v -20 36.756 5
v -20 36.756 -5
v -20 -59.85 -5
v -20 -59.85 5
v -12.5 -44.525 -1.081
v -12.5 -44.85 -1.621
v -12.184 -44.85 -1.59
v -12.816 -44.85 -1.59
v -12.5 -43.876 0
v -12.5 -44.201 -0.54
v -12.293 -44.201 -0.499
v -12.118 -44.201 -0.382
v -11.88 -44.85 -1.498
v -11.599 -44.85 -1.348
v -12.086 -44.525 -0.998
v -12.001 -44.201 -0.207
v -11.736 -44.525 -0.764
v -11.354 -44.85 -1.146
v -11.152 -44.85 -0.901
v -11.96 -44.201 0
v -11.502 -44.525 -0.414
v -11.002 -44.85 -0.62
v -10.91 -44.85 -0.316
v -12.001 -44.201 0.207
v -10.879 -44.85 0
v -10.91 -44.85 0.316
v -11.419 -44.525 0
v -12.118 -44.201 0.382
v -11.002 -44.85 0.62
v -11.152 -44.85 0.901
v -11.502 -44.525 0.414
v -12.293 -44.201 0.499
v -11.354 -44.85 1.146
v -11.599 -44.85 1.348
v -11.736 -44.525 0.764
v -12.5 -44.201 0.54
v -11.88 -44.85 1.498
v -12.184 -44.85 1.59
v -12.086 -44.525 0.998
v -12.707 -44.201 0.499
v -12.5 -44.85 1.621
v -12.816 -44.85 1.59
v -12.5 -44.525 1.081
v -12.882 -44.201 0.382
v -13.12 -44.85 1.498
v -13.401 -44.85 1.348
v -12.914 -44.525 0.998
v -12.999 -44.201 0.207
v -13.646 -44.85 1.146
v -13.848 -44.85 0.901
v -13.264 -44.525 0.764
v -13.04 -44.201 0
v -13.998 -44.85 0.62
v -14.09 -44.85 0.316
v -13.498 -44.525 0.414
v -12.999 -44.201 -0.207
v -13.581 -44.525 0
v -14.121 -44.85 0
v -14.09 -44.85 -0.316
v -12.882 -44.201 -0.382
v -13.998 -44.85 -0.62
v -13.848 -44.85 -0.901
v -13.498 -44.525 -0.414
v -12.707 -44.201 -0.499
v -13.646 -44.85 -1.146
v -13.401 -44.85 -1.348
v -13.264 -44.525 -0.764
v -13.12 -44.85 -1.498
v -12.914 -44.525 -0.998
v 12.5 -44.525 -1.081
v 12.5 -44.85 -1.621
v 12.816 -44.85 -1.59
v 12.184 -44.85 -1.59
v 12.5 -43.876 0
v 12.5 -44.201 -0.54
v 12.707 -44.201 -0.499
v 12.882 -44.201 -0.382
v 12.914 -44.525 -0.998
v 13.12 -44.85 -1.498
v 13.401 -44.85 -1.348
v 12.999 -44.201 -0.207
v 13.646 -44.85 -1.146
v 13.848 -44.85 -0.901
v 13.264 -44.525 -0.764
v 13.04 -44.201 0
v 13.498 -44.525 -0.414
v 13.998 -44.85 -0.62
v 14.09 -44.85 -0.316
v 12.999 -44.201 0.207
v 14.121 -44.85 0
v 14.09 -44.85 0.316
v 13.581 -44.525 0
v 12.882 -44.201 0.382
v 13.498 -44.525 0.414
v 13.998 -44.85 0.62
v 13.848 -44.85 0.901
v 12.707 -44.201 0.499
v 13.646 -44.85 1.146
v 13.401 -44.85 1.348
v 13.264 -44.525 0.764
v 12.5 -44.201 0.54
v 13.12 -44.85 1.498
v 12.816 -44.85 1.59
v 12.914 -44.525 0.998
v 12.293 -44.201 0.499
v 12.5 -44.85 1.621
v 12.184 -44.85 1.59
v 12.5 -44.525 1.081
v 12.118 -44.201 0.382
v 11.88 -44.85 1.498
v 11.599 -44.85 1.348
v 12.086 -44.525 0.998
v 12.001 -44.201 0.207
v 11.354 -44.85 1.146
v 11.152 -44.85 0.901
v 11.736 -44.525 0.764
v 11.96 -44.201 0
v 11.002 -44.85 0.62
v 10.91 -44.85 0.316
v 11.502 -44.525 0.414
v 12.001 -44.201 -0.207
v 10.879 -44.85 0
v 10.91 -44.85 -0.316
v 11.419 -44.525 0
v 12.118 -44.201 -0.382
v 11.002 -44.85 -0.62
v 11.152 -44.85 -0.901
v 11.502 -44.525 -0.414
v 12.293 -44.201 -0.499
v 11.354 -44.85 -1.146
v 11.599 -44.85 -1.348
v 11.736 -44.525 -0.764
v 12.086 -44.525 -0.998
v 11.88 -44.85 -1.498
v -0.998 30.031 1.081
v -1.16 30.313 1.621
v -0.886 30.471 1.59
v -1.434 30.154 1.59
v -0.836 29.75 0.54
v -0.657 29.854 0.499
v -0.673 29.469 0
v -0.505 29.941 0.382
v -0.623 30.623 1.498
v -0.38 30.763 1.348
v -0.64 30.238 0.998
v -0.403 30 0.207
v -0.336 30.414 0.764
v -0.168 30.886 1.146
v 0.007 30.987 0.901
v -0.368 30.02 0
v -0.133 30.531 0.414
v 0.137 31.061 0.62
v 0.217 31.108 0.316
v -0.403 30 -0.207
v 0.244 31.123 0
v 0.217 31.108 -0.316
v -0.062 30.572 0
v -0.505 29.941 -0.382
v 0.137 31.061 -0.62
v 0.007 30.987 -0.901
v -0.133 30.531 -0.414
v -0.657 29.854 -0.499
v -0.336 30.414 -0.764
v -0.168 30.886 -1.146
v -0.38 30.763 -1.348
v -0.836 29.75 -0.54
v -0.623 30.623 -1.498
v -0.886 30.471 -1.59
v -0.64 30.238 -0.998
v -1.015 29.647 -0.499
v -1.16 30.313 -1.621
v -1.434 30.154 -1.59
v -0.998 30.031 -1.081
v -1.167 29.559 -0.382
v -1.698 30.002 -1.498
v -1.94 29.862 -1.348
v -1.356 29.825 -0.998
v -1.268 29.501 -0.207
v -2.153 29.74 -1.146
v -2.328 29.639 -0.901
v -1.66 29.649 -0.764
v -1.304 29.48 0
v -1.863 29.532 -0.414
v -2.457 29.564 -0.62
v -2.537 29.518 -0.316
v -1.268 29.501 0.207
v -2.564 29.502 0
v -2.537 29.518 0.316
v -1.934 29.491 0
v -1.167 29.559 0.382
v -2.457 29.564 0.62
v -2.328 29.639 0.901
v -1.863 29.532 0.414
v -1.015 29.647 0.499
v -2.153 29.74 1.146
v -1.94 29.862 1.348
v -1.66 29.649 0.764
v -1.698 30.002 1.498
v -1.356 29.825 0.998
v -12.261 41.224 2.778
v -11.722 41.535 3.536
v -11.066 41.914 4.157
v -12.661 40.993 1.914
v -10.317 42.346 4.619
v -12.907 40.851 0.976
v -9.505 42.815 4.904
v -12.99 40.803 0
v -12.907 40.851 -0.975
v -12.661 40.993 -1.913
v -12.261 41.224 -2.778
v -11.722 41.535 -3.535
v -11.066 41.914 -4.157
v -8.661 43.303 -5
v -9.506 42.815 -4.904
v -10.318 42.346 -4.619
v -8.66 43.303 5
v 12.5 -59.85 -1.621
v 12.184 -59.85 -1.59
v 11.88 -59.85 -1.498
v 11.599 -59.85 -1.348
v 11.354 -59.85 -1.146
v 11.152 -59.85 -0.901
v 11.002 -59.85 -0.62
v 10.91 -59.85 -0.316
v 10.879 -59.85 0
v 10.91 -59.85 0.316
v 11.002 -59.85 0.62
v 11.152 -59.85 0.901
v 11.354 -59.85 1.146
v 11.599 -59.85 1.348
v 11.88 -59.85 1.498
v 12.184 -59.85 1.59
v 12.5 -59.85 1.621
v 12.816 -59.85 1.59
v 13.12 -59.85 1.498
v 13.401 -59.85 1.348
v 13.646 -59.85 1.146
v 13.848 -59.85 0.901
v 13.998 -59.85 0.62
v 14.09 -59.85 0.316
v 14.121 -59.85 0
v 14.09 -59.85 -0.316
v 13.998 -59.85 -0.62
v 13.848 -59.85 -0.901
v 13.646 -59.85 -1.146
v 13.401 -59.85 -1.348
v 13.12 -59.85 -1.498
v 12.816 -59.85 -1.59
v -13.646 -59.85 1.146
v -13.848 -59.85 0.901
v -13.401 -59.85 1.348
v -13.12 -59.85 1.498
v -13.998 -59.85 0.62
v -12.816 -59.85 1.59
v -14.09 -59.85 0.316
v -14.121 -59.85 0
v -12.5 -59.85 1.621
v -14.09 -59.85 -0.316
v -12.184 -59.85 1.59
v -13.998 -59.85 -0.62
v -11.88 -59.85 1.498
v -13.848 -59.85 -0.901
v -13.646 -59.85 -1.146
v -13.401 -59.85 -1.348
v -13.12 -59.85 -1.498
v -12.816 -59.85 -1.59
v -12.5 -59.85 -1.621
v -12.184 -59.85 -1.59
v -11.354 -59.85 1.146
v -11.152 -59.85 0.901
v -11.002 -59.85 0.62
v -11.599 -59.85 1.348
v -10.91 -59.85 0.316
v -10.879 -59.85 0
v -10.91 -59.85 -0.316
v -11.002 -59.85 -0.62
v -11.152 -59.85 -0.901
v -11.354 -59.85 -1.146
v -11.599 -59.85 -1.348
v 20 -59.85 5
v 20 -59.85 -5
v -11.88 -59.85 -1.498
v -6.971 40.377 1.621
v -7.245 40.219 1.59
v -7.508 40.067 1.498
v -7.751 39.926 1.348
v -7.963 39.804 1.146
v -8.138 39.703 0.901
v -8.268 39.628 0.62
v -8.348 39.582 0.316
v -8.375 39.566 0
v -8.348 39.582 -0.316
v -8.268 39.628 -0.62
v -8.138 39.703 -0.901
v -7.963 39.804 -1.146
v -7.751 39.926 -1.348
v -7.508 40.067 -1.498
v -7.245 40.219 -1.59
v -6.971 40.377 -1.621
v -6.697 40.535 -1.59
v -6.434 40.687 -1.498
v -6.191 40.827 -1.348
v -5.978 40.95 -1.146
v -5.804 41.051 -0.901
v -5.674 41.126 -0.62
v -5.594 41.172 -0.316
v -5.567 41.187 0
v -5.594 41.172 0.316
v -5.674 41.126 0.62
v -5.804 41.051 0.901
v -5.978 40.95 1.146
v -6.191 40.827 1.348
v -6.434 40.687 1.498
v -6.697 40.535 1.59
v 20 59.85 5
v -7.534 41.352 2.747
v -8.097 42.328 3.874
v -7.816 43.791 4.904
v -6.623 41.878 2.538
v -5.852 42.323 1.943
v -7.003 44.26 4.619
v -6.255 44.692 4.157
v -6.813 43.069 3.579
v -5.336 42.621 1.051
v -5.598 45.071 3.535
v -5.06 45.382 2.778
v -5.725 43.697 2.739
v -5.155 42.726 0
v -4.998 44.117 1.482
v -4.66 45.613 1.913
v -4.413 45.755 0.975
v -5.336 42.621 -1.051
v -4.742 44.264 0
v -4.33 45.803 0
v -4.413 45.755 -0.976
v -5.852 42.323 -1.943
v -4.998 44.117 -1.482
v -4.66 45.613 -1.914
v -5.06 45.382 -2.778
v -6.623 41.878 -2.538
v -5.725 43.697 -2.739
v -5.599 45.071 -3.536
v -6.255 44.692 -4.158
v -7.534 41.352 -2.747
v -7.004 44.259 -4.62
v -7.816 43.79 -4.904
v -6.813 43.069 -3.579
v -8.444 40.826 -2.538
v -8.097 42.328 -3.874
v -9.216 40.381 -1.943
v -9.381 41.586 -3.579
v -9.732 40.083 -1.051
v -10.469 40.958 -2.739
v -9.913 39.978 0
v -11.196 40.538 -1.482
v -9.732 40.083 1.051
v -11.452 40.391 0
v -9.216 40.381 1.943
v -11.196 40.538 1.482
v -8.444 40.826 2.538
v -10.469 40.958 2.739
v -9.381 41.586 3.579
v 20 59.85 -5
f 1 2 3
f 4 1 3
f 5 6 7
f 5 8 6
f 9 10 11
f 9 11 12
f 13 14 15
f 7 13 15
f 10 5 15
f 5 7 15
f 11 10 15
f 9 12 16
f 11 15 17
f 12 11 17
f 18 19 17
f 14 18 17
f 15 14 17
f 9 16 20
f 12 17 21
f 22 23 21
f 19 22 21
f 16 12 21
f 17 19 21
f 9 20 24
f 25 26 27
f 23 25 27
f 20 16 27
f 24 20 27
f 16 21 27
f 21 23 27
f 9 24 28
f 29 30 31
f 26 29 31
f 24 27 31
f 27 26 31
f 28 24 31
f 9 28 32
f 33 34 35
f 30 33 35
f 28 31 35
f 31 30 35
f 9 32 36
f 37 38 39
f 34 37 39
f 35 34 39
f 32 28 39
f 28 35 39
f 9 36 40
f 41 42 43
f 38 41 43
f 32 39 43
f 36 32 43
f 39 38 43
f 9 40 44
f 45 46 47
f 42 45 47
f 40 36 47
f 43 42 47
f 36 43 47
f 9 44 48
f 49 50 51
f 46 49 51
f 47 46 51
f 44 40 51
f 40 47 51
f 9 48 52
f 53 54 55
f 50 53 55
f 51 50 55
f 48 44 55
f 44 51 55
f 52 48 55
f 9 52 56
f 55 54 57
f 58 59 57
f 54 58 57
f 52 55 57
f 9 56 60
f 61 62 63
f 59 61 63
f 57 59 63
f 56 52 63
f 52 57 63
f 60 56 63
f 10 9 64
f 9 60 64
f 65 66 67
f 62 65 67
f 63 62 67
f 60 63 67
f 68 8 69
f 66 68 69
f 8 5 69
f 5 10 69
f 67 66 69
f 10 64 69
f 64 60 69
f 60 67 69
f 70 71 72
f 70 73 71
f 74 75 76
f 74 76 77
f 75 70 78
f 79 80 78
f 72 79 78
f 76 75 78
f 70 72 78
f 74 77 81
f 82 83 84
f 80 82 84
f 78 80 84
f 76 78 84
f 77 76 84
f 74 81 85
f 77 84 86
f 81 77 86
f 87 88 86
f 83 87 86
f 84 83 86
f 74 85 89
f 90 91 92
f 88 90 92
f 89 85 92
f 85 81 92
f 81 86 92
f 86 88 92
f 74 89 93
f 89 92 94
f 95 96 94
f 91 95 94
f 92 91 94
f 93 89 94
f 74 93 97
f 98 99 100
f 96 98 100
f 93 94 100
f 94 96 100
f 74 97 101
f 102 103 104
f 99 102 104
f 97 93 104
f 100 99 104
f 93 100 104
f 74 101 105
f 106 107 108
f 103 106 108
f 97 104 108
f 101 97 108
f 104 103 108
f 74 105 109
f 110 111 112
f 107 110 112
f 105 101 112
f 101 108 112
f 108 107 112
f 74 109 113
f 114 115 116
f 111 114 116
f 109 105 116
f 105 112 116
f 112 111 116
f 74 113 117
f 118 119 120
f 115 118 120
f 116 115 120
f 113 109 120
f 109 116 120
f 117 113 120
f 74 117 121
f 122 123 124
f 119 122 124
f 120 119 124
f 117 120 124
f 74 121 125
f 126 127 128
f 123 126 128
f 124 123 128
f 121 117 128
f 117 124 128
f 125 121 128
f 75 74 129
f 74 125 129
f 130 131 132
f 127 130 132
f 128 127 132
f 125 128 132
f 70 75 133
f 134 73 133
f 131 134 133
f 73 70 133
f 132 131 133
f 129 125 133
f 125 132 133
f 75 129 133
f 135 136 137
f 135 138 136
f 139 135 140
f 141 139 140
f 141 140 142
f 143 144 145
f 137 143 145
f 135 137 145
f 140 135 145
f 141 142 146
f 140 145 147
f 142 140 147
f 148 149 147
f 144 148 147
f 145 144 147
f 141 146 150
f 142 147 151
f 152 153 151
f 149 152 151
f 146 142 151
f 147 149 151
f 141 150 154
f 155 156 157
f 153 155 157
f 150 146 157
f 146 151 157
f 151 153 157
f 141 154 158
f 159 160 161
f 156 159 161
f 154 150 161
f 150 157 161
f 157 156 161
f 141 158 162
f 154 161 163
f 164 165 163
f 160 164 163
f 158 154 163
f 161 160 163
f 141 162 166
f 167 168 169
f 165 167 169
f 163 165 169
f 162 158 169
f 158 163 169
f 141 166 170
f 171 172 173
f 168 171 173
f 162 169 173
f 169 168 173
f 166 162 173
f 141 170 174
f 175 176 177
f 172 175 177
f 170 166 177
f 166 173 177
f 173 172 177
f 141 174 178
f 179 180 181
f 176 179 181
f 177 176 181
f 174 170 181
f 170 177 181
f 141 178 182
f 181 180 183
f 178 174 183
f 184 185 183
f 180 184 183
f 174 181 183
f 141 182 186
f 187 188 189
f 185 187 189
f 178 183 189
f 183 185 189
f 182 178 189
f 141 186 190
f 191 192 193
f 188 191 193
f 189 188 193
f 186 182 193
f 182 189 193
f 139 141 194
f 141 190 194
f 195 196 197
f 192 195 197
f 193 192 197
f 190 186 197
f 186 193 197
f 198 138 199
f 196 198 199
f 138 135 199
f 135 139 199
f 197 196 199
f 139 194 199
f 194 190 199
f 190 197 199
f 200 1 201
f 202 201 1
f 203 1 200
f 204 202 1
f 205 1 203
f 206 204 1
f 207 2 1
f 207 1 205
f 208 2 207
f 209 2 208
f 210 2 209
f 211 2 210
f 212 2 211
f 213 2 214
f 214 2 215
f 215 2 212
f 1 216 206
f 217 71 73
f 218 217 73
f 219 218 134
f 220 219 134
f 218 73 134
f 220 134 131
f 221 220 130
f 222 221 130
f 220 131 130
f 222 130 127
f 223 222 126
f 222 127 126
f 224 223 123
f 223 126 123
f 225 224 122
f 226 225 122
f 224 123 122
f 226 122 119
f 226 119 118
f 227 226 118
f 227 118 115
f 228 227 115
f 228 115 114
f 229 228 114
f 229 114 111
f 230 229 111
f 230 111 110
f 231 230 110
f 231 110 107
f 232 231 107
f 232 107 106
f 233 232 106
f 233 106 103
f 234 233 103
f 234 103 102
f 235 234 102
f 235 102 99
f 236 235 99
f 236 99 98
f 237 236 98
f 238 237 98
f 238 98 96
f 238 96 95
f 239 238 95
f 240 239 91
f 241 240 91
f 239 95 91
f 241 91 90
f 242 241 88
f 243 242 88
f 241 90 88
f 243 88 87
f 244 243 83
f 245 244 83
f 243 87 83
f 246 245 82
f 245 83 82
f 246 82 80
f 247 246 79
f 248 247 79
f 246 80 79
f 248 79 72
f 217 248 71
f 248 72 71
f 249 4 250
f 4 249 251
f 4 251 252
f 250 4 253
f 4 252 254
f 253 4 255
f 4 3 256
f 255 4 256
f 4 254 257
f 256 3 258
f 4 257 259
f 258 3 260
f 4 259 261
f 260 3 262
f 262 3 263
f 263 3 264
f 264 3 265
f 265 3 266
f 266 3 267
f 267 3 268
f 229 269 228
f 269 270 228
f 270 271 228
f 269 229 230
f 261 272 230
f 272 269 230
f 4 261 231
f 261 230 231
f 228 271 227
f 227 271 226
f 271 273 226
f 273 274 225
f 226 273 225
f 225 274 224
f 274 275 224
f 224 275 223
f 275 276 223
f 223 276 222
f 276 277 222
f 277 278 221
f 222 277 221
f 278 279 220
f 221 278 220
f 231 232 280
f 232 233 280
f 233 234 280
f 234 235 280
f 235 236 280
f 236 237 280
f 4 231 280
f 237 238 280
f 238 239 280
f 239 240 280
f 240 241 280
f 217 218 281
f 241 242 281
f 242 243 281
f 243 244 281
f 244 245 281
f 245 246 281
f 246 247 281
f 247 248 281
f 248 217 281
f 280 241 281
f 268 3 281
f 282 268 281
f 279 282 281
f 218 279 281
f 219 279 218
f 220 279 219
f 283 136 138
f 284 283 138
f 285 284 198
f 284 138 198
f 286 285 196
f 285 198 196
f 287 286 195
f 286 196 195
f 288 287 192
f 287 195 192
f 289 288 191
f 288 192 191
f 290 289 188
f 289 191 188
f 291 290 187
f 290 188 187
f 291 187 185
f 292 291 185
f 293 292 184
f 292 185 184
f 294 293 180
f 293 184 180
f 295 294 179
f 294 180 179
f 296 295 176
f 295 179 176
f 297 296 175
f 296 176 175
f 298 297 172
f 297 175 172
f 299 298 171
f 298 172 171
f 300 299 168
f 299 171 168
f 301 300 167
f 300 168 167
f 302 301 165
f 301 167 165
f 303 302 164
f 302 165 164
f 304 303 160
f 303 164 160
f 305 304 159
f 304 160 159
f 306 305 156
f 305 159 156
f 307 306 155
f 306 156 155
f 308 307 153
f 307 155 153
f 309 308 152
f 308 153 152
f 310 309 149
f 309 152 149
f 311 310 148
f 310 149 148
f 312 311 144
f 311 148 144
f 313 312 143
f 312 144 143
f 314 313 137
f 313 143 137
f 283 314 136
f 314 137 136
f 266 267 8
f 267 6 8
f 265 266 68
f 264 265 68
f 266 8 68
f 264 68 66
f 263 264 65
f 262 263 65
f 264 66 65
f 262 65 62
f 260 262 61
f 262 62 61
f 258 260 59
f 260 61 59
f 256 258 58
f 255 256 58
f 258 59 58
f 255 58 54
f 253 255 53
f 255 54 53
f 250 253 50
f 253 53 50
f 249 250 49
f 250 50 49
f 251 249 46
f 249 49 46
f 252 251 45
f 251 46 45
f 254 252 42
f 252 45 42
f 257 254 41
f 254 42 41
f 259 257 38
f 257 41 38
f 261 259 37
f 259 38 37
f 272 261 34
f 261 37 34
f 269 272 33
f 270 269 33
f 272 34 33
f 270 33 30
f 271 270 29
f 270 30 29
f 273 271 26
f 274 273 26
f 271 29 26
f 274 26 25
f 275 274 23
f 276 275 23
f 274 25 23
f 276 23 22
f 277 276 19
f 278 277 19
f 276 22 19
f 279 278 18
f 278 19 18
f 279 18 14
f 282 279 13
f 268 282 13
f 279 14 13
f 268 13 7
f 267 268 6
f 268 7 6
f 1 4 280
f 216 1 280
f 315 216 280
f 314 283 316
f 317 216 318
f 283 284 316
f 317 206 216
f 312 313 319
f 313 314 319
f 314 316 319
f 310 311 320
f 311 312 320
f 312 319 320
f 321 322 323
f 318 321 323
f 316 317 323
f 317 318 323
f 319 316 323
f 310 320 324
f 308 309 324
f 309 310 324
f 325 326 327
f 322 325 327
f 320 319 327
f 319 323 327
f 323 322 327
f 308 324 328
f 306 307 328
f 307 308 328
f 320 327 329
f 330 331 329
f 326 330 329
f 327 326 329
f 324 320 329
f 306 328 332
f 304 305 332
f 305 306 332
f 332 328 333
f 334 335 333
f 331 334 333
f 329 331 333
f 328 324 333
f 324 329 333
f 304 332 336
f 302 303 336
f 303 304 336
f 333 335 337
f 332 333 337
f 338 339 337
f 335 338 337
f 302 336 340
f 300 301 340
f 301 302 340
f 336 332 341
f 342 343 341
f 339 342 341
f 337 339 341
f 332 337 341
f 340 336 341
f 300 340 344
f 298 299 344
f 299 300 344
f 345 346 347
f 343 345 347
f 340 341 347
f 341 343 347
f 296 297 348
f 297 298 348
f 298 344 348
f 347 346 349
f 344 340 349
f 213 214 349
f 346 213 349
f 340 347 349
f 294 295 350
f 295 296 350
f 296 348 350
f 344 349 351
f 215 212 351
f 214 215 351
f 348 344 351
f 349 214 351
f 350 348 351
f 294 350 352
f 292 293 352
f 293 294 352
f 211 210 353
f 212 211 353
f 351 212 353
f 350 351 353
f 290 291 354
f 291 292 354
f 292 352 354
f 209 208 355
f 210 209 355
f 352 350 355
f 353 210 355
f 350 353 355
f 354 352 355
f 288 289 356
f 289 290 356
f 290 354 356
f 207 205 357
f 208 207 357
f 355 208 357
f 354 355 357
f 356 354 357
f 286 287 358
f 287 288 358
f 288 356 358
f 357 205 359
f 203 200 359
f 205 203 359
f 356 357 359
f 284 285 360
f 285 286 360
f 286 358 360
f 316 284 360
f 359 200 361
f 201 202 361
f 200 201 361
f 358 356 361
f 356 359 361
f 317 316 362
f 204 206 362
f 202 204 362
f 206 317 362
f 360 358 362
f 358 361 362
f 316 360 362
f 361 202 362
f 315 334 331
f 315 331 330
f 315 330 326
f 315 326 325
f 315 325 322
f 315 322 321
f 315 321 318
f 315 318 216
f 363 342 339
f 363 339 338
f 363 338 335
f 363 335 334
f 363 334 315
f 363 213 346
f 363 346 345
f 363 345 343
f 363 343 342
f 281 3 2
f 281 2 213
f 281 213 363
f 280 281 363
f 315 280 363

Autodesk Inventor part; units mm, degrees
ref_plane "YZ Plane" through (0, 0, 0) normal (1, 0, 0) x (0, 1, 0)
ref_plane "XZ Plane" through (0, 0, 0) normal (0, 1, 0) x (-1, 0, 0)
ref_plane "XY Plane" through (0, 0, 0) normal (0, 0, 1) x (1, 0, 0)
sketch "Esboço1" plane through (0, 0, 0) normal (0, 0, 1) x (1, 0, 0)
  line L0 (-20, -59.85) -> (20, -59.85)
  line L1 (20, -59.85) -> (20, 59.85)
  line L2 (20, 59.85) -> (-20, 59.85)
  line L3 (-20, 59.85) -> (-20, -59.85)
  line L4 (-20, 59.85) -> (20, 59.85)
  circle A0 centre (0, 49.85) radius 5 construction
  circle A1 centre (0, 49.85) radius 28 construction
  circle A2 centre (0, 49.85) radius 74 construction
  line L5 (-20, 30.2541) -> (20, 30.2541) construction
  line L6 (-20, -24.15) -> (20, -24.15) construction
  line L7 (-103.6, 0) -> (103.6, 0) construction
  line L8 (0, -96.59) -> (0, 160.59) construction
  line L9 (-20, 36.756) -> (20, 59.85)
  point P0 (0, 0)
  dimension "d0" = 119.7
  dimension "d1" = 40
  dimension "d41" = 10
  dimension "d42" = 109.7
  dimension "d43" = 56
  dimension "d45" = 84
  dimension "d49" = 30
  dimension "d58" = 10
extrude "Extrusão1" add sketch "Esboço1" along normal mid plane 10
extrude "Extrusão4" cut sketch "Esboço1" along normal through all both and the other way through all contours L3 L2 L9
sketch "Esboço2" plane through (-20, -59.85, -5) normal (0, -1, 0) x (1, 0, 0)
  line L0 (40, 10) -> (40, 0)
  line L1 (40, 5) -> (0, 5) construction
  line L2 (0, 0) -> (0, 10)
  line L3 (0, 0) -> (0, 10) projected
  line L4 (40, 0) -> (40, 10) projected
  line L5 (0, 10) -> (40, 10) construction
  line L6 (20, 10) -> (20, 0) construction
  line L7 (40, 0) -> (0, 0) construction
  point P0 (20, 5)
  point P1 (7.5, 5)
  point P2 (32.5, 5)
  dimension "d9" = 7.5
  dimension "d10" = 7.5
  dimension "d37" = 25
hole "Furo1" at (-12.5, -59.85, 0) at (12.5, -59.85, 0) direction (0, 1, 0) diameter 3.242 depth 15 tip angle 118 thread size "M4x0.7" class "6H" standard "ISO Metric profile"
sketch "Esboço3" plane through (0, 0, 5) normal (0, 0, 1) x (1, 0, 0)
  point P0 (0, 0)
  point P1 (0, 37.5)
  point P2 (0, 49.85)
hole "Furo2" [suppressed]
sketch "Esboço6" plane through (20, 59.85, 5) normal (-0.5, 0.8660254, 0) x (0.8660254, 0.5, 0)
  line L0 (0, 0) -> (0, 10) construction
  line L1 (0, 5) -> (-46.188, 5) construction
  line L2 (-46.188, 0) -> (-46.188, 10) construction
  line L3 (-23.094, 5) -> (-23.094, 0) construction
  point P0 (-47.2455, 5)
  point P1 (-33.094, 5)
  point P2 (-13.094, 5)
  dimension "d50" = 20
hole "Furo3" at (-8.6603, 43.303, 0) direction (0.5, -0.8660254, 0) diameter 3.242 depth 15 tip angle 118 countersink diameter 10 countersink angle 90 thread size "M4x0.7" class "6H" standard "ISO Metric profile"
properties part number "GRJ-03-116A" material "Fenolite OR"
